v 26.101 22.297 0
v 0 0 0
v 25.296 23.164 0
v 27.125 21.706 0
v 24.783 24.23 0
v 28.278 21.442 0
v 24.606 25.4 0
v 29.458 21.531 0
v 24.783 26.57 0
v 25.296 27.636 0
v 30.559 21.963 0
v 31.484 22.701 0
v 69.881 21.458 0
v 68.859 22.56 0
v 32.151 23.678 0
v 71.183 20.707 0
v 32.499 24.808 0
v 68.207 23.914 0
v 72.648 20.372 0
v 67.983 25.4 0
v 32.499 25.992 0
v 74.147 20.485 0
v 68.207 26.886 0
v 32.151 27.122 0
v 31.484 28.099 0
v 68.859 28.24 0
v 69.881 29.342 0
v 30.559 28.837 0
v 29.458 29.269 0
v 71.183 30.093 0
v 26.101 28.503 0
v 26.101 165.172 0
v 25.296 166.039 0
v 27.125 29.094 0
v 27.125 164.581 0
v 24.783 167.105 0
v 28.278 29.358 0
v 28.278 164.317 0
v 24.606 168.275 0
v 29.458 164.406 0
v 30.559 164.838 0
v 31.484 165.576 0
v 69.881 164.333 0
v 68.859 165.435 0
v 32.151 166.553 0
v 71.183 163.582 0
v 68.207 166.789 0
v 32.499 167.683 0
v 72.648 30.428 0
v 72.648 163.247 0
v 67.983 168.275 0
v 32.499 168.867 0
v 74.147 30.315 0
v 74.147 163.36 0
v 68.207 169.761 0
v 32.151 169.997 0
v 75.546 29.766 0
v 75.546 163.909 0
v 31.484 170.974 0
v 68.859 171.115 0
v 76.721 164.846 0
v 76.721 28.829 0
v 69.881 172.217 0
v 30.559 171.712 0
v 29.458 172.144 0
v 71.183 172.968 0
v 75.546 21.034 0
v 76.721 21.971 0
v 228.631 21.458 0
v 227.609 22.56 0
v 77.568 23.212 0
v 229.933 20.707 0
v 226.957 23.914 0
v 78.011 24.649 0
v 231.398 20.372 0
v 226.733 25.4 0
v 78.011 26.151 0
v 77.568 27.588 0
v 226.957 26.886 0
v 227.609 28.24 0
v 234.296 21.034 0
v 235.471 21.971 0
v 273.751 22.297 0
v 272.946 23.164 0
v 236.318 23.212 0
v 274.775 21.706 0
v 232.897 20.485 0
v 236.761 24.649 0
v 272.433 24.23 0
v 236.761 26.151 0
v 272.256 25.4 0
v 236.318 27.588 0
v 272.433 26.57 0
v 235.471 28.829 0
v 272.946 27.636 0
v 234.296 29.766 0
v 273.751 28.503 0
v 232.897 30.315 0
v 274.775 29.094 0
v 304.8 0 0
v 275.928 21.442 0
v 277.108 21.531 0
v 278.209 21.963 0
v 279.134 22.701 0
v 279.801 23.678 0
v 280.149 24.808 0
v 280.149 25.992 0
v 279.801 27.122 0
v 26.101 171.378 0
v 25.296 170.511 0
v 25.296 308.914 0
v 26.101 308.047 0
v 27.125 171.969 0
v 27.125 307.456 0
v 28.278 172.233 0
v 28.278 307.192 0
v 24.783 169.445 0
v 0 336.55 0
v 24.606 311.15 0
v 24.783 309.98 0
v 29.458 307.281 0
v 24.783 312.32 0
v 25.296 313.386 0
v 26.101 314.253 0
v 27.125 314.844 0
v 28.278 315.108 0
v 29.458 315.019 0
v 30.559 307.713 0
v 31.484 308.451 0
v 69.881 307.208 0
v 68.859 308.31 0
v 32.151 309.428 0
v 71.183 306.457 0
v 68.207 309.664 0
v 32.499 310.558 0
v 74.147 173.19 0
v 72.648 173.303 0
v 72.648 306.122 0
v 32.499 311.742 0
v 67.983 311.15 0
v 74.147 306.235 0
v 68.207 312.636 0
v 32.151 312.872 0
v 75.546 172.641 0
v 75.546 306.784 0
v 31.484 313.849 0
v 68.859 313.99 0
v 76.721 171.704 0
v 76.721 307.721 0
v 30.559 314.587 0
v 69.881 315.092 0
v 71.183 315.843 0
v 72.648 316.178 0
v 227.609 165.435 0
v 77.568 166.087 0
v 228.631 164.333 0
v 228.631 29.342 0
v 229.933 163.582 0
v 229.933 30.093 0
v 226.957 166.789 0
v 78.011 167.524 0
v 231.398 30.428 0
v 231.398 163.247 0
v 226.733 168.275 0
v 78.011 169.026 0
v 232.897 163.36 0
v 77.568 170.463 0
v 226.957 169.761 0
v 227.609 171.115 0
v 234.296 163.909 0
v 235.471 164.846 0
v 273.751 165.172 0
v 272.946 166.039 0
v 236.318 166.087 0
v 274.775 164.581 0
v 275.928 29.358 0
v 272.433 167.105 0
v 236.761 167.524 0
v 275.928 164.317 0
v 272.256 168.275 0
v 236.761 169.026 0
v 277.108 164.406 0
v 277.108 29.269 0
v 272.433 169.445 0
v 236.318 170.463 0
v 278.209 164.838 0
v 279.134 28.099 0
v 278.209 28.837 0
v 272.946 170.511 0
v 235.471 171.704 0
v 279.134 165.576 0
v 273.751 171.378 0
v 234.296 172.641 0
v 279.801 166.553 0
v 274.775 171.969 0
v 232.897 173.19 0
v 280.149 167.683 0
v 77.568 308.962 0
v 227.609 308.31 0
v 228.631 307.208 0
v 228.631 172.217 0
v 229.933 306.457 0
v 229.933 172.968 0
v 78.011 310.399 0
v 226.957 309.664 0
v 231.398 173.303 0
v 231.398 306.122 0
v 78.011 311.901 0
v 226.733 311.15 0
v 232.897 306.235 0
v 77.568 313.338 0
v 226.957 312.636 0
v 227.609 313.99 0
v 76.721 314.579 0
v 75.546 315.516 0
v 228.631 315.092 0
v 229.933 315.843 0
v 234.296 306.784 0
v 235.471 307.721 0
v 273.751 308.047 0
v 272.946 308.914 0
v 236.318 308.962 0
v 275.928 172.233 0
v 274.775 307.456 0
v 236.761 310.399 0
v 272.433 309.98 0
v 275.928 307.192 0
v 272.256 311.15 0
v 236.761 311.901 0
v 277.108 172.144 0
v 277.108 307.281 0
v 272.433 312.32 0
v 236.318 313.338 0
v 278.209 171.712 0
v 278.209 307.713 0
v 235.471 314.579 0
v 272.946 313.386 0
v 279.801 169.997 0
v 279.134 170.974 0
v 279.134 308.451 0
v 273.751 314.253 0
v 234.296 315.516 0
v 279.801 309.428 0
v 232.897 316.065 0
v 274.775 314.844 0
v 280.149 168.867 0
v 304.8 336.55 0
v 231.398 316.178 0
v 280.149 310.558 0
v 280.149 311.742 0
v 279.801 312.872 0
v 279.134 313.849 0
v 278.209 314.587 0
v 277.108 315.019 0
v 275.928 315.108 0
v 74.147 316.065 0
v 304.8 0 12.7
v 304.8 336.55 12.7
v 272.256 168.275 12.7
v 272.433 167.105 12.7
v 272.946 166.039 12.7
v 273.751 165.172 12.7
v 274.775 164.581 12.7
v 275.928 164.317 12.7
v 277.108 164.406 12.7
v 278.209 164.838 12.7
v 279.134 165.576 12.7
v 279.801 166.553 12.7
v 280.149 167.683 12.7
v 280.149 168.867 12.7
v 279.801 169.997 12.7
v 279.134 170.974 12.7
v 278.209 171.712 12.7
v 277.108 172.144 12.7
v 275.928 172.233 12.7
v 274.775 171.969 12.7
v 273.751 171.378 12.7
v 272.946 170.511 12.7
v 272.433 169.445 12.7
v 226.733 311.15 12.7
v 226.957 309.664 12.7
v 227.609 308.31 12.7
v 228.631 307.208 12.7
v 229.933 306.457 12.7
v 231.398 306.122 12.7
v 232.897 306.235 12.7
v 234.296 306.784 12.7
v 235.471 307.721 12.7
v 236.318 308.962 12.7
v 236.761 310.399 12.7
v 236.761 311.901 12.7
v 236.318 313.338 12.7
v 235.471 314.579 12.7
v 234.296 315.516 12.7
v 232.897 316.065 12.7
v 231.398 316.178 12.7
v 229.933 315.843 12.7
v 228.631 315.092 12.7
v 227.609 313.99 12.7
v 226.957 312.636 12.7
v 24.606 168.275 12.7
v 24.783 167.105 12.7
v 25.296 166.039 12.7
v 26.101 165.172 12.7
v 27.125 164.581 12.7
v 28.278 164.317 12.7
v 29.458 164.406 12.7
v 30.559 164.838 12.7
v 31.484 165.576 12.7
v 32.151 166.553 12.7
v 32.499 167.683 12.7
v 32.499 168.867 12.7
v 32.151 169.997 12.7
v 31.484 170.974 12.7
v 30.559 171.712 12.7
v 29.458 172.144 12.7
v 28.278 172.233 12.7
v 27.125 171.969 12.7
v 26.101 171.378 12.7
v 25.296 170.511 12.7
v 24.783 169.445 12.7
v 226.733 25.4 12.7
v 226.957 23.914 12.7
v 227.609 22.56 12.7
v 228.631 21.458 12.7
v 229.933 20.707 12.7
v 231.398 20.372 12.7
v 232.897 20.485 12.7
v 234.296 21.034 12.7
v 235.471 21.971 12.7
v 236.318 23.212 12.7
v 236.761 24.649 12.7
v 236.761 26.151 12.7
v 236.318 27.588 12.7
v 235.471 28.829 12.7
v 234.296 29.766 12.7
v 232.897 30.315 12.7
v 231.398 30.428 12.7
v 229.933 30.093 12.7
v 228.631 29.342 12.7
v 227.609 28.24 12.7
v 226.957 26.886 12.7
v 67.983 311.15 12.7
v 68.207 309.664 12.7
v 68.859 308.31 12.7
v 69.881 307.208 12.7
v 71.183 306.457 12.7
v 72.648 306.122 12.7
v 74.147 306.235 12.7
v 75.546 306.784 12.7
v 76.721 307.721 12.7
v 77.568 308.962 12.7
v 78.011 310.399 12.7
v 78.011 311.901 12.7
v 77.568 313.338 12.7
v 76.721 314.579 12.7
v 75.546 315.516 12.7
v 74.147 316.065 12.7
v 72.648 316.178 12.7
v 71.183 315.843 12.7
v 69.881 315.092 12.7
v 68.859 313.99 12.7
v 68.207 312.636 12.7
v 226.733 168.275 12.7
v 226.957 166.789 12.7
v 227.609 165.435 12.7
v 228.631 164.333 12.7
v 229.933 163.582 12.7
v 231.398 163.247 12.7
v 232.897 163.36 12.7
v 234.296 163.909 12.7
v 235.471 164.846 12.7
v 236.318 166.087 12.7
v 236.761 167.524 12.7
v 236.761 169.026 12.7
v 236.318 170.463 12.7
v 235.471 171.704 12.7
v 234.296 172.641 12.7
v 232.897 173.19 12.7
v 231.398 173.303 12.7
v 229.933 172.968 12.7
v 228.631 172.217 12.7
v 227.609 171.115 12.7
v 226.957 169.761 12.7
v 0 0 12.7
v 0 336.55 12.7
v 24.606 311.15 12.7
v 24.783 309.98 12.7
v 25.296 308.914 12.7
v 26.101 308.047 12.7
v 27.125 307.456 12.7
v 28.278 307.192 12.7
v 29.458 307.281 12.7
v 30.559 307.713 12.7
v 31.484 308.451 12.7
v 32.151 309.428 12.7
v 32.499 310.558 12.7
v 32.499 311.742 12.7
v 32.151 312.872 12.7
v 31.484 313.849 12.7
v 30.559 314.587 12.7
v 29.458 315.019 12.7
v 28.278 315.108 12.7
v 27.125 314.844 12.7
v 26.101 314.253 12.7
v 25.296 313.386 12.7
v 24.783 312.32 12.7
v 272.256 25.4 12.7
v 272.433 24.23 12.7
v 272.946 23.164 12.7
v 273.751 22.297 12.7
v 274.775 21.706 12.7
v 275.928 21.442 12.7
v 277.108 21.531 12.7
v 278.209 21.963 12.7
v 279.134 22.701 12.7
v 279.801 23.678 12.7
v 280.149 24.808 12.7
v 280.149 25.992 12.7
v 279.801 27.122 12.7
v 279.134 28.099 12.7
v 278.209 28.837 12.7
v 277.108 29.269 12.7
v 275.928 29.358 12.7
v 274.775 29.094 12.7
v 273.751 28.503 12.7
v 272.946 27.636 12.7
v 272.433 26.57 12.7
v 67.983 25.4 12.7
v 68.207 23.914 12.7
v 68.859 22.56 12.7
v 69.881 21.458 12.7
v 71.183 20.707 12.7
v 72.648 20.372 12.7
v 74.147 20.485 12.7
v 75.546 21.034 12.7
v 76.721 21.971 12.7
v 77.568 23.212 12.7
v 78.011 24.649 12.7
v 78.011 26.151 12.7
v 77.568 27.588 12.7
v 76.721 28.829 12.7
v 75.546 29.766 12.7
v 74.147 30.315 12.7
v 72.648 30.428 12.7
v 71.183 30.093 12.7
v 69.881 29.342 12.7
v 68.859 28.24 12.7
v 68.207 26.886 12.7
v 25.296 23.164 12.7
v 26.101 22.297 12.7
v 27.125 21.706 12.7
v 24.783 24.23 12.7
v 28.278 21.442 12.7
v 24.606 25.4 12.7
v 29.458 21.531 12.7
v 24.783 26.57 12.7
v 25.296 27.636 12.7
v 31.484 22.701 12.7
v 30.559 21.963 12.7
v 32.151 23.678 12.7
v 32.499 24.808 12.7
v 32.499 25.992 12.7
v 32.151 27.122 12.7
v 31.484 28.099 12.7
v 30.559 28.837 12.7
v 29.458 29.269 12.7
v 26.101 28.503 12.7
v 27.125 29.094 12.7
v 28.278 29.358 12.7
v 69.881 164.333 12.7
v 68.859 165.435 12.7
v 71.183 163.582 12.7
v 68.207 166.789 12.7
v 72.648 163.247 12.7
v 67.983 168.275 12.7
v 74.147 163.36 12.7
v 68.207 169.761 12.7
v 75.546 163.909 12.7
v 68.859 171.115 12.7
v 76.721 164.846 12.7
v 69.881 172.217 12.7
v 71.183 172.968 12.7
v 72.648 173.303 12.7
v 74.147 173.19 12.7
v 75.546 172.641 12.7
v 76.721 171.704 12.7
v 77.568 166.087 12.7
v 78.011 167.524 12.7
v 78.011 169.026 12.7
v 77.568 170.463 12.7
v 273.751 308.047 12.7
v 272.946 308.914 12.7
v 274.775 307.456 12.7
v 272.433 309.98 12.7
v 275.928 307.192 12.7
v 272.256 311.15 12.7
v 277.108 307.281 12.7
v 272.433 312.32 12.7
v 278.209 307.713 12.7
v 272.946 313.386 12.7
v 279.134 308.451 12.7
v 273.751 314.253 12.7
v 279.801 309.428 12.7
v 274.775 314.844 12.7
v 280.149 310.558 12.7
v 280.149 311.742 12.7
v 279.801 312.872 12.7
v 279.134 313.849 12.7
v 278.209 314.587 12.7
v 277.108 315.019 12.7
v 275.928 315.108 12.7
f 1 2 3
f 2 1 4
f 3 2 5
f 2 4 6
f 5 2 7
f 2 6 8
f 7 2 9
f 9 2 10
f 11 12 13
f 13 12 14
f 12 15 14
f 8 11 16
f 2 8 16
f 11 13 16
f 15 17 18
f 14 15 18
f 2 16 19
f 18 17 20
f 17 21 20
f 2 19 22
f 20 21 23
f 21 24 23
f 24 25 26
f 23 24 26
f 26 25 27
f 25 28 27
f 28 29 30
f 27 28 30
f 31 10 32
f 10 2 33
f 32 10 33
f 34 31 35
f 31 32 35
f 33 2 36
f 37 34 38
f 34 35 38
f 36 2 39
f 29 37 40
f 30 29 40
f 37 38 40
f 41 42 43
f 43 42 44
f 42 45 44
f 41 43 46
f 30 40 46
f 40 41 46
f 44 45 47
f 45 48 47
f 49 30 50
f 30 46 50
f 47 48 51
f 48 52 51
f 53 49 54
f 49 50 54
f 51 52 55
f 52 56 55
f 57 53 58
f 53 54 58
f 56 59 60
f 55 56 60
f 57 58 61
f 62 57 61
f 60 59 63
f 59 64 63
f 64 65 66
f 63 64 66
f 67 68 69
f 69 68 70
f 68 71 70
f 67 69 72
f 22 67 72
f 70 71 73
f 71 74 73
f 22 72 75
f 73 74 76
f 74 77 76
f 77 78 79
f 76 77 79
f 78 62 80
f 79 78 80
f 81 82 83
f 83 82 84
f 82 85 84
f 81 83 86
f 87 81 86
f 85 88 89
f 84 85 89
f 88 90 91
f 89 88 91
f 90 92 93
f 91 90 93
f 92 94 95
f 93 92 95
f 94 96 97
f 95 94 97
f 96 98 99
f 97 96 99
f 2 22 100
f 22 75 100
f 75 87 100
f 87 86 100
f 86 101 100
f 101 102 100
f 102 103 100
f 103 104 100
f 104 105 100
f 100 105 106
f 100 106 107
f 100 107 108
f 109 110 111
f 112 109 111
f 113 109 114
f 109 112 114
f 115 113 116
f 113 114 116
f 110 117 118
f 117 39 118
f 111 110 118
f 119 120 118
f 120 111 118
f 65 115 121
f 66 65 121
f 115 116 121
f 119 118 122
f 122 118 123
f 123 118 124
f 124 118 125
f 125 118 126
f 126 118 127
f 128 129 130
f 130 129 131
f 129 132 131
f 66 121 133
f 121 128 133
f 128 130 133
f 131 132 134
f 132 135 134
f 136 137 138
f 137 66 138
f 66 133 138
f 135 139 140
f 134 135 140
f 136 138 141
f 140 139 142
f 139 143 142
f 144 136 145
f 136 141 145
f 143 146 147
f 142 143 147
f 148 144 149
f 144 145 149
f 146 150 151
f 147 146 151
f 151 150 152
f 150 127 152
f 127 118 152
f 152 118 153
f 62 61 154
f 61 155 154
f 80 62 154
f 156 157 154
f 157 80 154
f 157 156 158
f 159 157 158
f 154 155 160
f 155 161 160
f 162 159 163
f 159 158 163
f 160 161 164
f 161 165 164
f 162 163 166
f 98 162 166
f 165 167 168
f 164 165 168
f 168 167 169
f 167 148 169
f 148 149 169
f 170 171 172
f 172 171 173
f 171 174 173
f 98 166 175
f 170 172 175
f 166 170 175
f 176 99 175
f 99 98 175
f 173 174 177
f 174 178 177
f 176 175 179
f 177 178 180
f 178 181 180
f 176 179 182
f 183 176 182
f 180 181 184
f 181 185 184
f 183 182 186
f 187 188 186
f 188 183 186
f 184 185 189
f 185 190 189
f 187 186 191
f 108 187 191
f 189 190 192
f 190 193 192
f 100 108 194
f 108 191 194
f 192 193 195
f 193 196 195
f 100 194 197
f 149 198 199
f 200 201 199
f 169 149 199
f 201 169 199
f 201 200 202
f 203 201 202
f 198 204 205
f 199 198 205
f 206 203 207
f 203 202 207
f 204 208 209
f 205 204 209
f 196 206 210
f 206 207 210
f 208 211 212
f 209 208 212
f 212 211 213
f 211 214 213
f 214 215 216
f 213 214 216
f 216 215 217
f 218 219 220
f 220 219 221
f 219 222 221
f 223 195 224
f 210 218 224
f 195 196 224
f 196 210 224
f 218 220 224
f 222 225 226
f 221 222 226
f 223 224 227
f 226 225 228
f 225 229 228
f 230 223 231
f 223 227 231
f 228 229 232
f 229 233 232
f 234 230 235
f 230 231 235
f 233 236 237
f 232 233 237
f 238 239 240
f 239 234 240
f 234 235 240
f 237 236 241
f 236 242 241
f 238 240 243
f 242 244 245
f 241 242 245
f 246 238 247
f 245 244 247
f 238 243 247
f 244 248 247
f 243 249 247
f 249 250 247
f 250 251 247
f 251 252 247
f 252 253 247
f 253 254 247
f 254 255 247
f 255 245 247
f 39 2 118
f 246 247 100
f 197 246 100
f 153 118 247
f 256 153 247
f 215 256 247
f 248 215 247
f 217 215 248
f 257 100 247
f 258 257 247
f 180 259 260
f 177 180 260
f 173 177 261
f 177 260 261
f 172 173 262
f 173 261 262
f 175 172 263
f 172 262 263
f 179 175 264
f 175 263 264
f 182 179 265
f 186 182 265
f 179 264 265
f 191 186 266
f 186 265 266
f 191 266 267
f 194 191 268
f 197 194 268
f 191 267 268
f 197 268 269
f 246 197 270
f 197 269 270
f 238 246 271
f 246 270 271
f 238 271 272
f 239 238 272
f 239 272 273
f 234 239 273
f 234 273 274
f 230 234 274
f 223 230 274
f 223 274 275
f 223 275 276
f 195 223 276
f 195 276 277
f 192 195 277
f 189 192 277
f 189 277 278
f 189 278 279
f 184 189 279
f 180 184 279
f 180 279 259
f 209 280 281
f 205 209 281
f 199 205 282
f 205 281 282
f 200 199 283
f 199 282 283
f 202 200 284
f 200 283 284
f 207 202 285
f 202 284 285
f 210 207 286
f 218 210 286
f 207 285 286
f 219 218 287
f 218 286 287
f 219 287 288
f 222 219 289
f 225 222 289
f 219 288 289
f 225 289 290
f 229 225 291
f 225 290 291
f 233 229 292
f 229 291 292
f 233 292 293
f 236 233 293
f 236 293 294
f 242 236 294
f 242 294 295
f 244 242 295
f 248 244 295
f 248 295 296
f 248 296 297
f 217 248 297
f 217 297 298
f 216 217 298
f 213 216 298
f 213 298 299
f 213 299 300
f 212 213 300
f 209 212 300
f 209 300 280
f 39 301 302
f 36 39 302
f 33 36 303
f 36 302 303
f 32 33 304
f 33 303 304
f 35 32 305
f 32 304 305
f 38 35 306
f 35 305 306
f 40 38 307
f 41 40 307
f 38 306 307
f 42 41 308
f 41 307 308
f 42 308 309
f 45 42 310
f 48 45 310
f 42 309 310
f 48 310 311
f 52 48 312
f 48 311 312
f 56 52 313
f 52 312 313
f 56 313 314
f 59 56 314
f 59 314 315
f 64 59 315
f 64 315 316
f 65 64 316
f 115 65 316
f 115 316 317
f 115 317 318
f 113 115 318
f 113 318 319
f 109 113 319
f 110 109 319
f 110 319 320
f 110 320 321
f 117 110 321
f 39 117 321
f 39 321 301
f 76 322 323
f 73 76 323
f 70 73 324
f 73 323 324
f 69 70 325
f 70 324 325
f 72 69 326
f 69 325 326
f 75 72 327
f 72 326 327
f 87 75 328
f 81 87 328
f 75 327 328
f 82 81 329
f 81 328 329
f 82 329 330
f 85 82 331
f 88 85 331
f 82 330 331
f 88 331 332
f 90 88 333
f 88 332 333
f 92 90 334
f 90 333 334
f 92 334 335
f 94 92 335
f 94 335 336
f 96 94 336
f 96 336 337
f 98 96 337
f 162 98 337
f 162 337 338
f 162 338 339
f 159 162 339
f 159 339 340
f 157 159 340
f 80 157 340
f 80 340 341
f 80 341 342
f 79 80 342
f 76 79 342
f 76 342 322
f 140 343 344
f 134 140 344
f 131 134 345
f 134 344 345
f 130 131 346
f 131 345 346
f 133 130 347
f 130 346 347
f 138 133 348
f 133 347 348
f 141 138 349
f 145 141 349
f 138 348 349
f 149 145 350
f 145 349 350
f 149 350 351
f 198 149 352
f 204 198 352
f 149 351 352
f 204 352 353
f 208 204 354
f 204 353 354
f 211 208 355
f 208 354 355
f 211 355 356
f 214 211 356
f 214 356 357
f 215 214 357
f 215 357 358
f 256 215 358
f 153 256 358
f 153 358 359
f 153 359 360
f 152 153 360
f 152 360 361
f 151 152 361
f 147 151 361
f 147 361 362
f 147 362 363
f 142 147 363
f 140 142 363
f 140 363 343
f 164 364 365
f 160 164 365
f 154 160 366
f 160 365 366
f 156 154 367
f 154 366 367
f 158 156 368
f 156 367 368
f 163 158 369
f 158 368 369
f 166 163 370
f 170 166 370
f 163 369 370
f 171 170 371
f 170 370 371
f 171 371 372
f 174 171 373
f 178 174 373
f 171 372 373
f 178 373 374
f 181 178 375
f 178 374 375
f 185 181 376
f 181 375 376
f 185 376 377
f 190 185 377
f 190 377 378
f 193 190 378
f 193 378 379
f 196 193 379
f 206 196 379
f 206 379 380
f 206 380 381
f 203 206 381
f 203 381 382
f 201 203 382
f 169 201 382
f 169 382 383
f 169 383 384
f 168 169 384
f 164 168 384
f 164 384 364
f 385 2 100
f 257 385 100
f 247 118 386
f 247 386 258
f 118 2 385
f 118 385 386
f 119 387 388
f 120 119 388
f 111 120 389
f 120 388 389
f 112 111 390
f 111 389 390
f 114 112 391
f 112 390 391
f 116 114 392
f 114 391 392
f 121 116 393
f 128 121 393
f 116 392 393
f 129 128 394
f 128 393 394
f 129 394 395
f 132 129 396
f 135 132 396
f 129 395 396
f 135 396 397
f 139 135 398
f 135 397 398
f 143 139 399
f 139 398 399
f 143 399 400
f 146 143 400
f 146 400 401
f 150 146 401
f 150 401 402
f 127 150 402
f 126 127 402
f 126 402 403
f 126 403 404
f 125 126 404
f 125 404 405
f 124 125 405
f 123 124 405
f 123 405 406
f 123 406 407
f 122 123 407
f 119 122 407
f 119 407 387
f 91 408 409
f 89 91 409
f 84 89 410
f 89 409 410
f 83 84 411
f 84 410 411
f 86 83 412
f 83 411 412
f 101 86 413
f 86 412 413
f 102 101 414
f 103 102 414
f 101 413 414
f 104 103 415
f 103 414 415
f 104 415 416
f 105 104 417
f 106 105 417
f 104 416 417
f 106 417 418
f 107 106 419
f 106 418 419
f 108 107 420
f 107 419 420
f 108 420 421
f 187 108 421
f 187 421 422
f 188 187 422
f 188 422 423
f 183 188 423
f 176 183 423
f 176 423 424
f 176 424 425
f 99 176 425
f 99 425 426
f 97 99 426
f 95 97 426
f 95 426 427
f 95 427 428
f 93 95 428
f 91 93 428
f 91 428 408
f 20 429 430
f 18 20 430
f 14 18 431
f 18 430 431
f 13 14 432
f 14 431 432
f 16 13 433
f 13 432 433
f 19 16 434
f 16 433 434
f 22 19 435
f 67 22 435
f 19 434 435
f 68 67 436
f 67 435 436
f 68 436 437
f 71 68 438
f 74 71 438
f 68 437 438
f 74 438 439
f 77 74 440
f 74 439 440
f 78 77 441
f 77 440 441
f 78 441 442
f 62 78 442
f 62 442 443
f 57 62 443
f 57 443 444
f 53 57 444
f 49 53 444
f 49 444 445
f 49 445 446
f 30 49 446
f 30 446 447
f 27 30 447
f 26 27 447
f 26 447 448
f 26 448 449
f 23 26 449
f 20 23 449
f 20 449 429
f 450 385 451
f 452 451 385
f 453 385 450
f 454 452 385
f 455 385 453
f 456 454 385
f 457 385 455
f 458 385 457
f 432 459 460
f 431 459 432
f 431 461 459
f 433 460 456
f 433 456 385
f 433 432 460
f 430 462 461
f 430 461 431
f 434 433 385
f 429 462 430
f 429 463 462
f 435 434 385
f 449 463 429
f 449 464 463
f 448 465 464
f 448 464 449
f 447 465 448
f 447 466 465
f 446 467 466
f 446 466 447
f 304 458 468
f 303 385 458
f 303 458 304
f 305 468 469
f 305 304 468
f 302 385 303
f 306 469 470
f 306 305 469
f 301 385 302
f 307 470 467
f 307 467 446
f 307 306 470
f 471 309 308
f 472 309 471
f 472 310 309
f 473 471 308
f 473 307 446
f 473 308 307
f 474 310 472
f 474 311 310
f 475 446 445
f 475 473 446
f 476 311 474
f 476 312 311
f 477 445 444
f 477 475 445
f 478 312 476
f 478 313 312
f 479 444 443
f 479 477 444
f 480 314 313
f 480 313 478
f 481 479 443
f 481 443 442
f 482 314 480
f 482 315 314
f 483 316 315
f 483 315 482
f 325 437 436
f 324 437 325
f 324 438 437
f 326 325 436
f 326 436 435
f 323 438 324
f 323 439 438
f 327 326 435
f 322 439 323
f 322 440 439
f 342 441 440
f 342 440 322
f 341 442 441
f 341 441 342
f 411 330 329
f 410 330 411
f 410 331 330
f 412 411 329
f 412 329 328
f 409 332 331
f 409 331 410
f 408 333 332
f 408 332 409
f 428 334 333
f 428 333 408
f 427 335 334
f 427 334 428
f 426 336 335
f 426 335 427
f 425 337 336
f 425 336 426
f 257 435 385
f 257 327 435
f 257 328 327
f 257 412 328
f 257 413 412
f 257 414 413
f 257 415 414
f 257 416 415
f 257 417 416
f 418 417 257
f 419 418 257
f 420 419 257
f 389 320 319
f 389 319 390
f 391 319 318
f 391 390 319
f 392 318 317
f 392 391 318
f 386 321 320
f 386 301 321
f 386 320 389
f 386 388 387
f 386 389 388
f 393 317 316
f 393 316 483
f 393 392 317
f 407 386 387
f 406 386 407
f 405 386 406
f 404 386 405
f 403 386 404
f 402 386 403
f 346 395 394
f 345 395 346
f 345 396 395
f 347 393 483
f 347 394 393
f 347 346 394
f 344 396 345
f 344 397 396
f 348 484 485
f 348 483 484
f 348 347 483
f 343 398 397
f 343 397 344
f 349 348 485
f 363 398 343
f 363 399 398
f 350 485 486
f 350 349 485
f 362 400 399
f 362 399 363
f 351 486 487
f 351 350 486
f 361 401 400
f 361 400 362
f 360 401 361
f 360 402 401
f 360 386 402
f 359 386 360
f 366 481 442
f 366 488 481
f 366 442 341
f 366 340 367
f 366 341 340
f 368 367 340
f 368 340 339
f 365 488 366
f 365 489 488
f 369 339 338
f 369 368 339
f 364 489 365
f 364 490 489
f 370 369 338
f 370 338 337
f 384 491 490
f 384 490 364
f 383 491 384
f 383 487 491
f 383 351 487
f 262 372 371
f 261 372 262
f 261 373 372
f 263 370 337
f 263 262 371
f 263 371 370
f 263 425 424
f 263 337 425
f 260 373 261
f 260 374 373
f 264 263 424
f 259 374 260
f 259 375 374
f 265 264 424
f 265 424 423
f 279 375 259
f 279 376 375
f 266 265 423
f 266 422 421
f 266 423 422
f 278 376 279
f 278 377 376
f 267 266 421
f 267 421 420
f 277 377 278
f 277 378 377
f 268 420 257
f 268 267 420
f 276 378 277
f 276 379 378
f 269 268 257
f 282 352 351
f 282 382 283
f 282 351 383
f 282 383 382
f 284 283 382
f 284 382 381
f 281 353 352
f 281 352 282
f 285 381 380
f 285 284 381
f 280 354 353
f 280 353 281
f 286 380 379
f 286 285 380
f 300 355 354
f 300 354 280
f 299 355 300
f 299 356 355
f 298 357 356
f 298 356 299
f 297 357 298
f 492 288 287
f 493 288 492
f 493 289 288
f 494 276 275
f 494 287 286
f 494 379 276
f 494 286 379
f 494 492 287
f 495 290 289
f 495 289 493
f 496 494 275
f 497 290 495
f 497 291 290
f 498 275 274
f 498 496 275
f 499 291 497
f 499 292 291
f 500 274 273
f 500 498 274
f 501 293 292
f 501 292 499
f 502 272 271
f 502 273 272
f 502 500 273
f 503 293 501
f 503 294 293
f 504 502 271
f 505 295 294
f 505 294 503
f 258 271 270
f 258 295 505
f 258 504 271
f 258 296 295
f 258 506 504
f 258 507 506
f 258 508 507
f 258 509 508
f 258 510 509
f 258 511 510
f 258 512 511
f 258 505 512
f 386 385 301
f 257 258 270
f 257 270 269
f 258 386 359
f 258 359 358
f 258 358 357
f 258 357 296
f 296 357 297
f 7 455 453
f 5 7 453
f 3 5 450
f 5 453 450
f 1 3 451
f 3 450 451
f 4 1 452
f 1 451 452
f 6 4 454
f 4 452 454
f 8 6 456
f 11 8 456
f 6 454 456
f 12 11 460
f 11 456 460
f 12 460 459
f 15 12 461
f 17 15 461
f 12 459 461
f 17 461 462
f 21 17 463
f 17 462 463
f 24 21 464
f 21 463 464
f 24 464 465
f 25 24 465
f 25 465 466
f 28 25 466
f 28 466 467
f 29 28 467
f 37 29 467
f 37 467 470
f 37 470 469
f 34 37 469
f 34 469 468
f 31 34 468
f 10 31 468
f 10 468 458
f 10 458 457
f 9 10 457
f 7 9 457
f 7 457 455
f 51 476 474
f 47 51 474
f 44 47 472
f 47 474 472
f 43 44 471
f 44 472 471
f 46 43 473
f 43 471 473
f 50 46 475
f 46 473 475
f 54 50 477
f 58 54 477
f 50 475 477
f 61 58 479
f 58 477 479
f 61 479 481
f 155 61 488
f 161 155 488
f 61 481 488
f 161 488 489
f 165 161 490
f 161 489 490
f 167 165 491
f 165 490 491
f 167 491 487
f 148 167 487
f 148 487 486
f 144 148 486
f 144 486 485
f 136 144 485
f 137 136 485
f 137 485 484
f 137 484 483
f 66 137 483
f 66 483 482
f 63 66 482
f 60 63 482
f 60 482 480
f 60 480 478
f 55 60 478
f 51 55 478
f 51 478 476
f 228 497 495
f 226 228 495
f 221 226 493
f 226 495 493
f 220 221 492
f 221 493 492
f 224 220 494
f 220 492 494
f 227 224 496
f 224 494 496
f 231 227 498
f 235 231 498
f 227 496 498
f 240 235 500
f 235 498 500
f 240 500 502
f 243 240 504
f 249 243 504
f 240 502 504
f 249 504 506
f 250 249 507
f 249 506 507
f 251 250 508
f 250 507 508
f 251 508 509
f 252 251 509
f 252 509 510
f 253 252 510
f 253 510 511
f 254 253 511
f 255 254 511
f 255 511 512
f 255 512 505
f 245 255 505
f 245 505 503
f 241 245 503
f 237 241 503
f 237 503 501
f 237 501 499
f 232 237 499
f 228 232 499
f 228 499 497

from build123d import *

# Parameters (mm, degrees)
F0_W     = 304.8
F0_H     = 336.55
F1_DEPTH = 12.7
F2_D     = 7.9375
F3_D     = 10.0838


with BuildPart() as f1:
    # F0 (on Top) → F1 (new body)
    with BuildSketch(Plane.XY):
        with Locations((152.4, 168.275)):
            Rectangle(F0_W, F0_H)
    extrude(amount=F1_DEPTH)

    # F2 (through all)
    with Locations(Plane(origin=(0, 0, 0), x_dir=(1, 0, 0), z_dir=(0, 0, -1))):
        with Locations((276.225, -25.4), (276.225, -311.15), (276.225, -168.275), (28.575, -168.275), (28.575, -311.15), (28.575, -25.4)):
            Hole(F2_D / 2)

    # F3 (through all)
    with Locations(Plane(origin=(0, 0, 0), x_dir=(1, 0, 0), z_dir=(0, 0, -1))):
        with Locations((231.775, -25.4), (231.775, -168.275), (231.775, -311.15), (73.025, -311.15), (73.025, -168.275), (73.025, -25.4)):
            Hole(F3_D / 2)


solid = f1.part
